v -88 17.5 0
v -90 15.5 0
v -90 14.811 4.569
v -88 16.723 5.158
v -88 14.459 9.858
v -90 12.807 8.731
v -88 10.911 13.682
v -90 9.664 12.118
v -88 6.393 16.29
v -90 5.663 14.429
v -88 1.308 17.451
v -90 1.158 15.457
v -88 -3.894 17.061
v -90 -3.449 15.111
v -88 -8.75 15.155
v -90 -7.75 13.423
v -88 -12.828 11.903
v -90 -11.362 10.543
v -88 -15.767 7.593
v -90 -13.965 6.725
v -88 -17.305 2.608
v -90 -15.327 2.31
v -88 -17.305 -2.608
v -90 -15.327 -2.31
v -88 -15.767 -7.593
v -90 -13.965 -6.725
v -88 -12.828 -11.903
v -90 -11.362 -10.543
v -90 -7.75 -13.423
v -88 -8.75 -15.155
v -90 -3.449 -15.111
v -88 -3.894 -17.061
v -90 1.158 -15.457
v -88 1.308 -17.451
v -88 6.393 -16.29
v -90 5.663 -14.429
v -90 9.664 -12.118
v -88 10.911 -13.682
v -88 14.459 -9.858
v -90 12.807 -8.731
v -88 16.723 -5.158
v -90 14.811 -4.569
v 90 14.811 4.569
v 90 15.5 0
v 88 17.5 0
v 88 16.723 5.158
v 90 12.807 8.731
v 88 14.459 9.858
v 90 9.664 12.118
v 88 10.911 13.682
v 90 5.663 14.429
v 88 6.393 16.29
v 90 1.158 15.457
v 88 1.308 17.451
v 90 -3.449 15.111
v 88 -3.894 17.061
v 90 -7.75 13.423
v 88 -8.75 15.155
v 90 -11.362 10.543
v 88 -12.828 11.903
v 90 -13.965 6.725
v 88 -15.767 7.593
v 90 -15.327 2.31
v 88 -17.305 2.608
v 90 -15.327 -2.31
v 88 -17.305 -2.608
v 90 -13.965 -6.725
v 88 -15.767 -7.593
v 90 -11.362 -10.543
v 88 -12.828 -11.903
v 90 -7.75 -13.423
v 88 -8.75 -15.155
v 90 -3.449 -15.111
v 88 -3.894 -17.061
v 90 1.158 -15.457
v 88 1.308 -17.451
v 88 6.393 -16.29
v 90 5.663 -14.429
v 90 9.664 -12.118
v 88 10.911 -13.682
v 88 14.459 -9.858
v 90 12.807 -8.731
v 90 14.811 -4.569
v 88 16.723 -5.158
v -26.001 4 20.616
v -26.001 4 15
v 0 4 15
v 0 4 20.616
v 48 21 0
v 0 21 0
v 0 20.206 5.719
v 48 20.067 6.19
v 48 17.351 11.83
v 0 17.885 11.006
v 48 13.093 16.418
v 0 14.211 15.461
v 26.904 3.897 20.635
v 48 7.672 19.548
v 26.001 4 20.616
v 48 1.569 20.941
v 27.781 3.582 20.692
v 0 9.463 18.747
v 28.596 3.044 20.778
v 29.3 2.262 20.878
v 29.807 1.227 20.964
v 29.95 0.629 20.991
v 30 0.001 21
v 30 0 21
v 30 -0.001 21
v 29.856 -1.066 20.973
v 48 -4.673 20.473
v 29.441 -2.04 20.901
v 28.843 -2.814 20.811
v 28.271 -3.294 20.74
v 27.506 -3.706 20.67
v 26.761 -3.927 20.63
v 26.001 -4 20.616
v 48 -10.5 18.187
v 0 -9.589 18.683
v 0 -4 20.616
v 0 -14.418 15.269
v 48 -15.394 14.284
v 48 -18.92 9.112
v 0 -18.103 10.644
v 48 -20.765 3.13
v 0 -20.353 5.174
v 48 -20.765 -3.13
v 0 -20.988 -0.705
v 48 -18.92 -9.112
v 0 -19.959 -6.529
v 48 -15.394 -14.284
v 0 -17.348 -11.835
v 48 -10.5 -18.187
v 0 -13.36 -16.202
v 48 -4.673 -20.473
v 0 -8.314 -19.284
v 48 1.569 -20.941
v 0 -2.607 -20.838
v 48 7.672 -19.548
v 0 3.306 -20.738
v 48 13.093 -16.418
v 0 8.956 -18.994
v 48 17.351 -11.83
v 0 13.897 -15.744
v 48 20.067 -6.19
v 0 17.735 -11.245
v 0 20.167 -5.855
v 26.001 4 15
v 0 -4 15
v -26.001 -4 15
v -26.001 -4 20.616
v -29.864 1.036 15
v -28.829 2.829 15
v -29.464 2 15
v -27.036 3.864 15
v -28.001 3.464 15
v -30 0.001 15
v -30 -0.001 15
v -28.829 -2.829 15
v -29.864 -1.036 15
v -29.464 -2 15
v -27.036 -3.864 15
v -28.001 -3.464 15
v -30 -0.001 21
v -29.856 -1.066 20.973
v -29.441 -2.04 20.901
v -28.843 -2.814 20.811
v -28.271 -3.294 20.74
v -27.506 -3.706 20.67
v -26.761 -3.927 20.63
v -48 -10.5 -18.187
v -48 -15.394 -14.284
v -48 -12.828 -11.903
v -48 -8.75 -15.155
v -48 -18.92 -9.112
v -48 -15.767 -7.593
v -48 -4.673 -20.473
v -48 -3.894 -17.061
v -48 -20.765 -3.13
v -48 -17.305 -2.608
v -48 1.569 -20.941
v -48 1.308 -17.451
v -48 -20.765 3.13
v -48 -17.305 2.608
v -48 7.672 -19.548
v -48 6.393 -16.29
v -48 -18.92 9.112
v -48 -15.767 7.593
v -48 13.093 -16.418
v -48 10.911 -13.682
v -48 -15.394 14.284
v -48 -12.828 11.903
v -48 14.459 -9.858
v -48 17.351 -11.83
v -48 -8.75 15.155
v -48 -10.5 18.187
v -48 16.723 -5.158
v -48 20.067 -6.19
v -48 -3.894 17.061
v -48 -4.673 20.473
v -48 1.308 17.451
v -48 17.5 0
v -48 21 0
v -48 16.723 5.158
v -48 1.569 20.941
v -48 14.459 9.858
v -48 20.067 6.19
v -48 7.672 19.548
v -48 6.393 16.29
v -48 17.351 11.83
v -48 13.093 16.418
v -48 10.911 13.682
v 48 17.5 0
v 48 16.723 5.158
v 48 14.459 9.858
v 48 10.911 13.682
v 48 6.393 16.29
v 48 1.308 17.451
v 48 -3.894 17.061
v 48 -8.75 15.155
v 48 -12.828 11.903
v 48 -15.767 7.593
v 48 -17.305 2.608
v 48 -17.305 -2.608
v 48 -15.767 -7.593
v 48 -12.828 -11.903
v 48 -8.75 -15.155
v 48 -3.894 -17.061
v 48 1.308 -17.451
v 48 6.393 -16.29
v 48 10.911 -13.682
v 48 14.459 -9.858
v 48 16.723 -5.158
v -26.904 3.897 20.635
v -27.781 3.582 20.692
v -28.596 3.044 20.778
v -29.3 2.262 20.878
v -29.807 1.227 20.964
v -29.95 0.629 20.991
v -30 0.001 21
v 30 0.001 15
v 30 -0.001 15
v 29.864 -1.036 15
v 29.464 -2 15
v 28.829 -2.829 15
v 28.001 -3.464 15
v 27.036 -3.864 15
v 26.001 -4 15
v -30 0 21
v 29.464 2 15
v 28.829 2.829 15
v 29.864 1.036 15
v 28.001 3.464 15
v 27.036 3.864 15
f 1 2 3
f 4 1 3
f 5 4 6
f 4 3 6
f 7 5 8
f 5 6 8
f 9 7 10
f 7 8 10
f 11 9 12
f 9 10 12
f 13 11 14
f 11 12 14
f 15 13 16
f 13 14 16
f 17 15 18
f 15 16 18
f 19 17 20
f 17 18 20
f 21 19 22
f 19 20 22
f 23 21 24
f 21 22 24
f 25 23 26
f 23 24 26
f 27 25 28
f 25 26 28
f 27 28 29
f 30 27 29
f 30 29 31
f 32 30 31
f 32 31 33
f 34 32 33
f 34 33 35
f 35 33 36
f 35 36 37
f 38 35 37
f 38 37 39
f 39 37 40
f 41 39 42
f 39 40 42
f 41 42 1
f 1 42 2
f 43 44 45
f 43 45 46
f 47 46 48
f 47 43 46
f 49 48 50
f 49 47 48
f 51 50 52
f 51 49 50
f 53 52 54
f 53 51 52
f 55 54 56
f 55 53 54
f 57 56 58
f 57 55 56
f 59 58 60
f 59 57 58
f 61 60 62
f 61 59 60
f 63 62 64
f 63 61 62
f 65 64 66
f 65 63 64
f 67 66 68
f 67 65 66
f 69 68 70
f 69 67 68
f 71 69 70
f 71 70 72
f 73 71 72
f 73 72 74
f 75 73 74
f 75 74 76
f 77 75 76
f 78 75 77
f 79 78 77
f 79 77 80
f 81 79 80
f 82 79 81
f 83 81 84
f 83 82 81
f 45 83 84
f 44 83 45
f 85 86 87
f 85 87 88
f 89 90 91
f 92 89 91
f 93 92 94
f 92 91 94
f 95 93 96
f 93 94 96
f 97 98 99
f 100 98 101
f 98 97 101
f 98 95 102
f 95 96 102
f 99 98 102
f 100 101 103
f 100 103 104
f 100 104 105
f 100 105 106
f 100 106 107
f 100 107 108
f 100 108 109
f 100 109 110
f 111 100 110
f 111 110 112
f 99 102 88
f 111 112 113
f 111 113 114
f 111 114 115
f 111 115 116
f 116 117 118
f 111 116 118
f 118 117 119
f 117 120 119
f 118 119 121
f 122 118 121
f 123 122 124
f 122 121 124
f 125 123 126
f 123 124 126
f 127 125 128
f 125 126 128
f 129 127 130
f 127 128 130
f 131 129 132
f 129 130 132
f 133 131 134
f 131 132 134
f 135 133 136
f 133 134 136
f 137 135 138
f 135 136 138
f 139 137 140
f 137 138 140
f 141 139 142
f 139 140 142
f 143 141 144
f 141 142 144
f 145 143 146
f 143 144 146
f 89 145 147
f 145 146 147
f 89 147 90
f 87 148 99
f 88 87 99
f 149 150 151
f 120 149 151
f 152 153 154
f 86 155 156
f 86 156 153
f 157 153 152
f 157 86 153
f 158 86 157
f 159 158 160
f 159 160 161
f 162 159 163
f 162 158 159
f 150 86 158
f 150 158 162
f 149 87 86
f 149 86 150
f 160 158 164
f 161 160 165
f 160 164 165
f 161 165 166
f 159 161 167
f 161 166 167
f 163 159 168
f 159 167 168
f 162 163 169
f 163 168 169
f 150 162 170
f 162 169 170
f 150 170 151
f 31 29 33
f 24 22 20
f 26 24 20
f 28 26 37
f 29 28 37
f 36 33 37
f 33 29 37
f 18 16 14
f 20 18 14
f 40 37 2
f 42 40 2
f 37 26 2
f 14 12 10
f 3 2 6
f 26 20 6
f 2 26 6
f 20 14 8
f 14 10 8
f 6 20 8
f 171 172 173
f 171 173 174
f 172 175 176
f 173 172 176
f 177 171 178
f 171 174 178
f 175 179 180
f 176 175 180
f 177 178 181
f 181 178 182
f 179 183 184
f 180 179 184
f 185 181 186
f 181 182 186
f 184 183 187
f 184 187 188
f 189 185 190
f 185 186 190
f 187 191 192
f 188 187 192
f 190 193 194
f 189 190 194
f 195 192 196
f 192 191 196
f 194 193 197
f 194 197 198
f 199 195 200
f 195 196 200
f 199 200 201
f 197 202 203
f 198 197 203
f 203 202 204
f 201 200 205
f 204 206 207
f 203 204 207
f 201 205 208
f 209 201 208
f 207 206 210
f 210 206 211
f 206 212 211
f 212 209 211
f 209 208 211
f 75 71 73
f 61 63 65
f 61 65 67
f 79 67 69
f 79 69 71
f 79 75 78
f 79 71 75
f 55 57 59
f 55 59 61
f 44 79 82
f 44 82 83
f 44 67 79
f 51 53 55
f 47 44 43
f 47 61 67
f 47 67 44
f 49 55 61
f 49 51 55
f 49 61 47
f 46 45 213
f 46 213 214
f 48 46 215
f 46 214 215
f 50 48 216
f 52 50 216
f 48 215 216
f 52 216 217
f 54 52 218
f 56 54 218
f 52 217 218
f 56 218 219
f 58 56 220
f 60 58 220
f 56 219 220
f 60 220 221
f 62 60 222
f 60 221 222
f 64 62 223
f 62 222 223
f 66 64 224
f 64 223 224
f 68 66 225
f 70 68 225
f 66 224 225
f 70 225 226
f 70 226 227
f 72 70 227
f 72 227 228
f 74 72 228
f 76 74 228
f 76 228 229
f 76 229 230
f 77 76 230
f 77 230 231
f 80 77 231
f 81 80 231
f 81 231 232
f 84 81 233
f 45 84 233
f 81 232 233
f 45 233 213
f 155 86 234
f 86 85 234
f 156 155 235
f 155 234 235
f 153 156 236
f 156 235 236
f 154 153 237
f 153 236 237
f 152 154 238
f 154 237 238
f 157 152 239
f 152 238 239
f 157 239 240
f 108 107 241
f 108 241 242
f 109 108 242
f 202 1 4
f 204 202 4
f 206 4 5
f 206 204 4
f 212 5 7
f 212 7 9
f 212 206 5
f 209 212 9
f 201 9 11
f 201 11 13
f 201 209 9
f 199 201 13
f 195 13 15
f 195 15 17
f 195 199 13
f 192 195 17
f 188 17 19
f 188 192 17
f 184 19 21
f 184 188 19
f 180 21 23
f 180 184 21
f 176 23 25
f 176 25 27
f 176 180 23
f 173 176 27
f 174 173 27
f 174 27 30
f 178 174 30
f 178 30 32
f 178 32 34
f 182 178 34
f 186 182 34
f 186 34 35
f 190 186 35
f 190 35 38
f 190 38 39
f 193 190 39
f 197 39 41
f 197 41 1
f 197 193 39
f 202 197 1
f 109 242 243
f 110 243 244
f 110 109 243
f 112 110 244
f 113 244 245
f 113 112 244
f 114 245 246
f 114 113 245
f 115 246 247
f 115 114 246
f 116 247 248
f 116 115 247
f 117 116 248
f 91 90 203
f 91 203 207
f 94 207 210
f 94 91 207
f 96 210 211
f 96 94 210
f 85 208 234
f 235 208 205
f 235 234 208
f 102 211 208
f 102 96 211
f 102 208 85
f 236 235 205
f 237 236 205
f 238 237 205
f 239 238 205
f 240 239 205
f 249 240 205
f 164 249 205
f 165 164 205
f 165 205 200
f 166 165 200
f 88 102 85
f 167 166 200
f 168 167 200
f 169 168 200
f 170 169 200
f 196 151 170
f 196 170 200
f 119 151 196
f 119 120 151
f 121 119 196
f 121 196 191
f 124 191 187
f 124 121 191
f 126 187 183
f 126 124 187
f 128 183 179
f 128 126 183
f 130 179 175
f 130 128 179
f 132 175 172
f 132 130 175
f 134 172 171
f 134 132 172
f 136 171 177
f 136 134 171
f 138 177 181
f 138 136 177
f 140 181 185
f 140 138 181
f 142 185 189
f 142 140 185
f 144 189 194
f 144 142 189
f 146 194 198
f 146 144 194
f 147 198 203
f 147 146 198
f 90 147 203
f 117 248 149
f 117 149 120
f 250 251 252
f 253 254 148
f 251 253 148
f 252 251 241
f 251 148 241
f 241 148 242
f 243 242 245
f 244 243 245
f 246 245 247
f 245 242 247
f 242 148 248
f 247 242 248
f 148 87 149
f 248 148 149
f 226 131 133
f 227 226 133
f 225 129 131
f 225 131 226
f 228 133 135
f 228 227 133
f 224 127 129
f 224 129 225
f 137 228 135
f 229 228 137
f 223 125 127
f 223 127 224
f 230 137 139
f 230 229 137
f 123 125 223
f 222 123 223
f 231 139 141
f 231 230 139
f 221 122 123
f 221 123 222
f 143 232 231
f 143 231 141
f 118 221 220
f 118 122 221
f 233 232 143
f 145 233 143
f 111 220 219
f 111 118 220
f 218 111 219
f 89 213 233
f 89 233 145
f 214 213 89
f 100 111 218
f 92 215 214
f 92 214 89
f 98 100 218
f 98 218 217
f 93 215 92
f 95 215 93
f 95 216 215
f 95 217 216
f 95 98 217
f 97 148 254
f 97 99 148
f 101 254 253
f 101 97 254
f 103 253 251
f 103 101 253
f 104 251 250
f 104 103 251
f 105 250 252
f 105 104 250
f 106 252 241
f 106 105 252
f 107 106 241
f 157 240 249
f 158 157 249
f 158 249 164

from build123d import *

# Parameters (mm, degrees)
F0_R     = 21
F1_DEPTH = 48
F2_R     = 17.5
F3_DEPTH = 42
F4_SIZE  = 2
F5_W     = 8
F5_H     = 12
F6_DEPTH = 30
F7_R     = 3.999


# Not quite as in the source:
# - a fillet or chamfer is up to 0.001 mm smaller than in the source, because OpenCascade refuses the exact size


with BuildPart() as f1:
    # F0 (on Right) → F1 (new body)
    with BuildSketch(Plane.YZ):
        Circle(F0_R)
    extrude(amount=F1_DEPTH)

    # F2 (on face) → F3 (join)
    with BuildSketch(Plane.YZ.offset(48)):
        Circle(F2_R)
    extrude(amount=F3_DEPTH)

    # F4
    f4_edges = [f1.edges().sort_by_distance(p)[0] for p in [
        (90, -17.5, 0),
    ]]
    chamfer(f4_edges, length=F4_SIZE)

    # F5 (on face) → F6 (cut)
    with BuildSketch(Plane(origin=(0, 0, 0), x_dir=(0, -1, 0), z_dir=(-1, 0, 0))):
        with Locations((0, 21)):
            Rectangle(F5_W, F5_H)
    extrude(amount=-F6_DEPTH, mode=Mode.SUBTRACT)

    # F7 (radius 4 in the source; OpenCascade refuses exactly that, so slightly less here)
    f7_edges = [f1.edges().sort_by_distance(p)[0] for p in [
        (30, 4, 17.807764),
        (30, -4, 17.807764),
    ]]
    fillet(f7_edges, radius=F7_R)

    # F8: F1 across face


with BuildPart() as f1_1:
    add(f1.part)
    add(f1.part.mirror(Plane(origin=(0, 0, -0.629577464), x_dir=(0, 1, 0), z_dir=(-1, 0, 0))))


solid = f1_1.part
